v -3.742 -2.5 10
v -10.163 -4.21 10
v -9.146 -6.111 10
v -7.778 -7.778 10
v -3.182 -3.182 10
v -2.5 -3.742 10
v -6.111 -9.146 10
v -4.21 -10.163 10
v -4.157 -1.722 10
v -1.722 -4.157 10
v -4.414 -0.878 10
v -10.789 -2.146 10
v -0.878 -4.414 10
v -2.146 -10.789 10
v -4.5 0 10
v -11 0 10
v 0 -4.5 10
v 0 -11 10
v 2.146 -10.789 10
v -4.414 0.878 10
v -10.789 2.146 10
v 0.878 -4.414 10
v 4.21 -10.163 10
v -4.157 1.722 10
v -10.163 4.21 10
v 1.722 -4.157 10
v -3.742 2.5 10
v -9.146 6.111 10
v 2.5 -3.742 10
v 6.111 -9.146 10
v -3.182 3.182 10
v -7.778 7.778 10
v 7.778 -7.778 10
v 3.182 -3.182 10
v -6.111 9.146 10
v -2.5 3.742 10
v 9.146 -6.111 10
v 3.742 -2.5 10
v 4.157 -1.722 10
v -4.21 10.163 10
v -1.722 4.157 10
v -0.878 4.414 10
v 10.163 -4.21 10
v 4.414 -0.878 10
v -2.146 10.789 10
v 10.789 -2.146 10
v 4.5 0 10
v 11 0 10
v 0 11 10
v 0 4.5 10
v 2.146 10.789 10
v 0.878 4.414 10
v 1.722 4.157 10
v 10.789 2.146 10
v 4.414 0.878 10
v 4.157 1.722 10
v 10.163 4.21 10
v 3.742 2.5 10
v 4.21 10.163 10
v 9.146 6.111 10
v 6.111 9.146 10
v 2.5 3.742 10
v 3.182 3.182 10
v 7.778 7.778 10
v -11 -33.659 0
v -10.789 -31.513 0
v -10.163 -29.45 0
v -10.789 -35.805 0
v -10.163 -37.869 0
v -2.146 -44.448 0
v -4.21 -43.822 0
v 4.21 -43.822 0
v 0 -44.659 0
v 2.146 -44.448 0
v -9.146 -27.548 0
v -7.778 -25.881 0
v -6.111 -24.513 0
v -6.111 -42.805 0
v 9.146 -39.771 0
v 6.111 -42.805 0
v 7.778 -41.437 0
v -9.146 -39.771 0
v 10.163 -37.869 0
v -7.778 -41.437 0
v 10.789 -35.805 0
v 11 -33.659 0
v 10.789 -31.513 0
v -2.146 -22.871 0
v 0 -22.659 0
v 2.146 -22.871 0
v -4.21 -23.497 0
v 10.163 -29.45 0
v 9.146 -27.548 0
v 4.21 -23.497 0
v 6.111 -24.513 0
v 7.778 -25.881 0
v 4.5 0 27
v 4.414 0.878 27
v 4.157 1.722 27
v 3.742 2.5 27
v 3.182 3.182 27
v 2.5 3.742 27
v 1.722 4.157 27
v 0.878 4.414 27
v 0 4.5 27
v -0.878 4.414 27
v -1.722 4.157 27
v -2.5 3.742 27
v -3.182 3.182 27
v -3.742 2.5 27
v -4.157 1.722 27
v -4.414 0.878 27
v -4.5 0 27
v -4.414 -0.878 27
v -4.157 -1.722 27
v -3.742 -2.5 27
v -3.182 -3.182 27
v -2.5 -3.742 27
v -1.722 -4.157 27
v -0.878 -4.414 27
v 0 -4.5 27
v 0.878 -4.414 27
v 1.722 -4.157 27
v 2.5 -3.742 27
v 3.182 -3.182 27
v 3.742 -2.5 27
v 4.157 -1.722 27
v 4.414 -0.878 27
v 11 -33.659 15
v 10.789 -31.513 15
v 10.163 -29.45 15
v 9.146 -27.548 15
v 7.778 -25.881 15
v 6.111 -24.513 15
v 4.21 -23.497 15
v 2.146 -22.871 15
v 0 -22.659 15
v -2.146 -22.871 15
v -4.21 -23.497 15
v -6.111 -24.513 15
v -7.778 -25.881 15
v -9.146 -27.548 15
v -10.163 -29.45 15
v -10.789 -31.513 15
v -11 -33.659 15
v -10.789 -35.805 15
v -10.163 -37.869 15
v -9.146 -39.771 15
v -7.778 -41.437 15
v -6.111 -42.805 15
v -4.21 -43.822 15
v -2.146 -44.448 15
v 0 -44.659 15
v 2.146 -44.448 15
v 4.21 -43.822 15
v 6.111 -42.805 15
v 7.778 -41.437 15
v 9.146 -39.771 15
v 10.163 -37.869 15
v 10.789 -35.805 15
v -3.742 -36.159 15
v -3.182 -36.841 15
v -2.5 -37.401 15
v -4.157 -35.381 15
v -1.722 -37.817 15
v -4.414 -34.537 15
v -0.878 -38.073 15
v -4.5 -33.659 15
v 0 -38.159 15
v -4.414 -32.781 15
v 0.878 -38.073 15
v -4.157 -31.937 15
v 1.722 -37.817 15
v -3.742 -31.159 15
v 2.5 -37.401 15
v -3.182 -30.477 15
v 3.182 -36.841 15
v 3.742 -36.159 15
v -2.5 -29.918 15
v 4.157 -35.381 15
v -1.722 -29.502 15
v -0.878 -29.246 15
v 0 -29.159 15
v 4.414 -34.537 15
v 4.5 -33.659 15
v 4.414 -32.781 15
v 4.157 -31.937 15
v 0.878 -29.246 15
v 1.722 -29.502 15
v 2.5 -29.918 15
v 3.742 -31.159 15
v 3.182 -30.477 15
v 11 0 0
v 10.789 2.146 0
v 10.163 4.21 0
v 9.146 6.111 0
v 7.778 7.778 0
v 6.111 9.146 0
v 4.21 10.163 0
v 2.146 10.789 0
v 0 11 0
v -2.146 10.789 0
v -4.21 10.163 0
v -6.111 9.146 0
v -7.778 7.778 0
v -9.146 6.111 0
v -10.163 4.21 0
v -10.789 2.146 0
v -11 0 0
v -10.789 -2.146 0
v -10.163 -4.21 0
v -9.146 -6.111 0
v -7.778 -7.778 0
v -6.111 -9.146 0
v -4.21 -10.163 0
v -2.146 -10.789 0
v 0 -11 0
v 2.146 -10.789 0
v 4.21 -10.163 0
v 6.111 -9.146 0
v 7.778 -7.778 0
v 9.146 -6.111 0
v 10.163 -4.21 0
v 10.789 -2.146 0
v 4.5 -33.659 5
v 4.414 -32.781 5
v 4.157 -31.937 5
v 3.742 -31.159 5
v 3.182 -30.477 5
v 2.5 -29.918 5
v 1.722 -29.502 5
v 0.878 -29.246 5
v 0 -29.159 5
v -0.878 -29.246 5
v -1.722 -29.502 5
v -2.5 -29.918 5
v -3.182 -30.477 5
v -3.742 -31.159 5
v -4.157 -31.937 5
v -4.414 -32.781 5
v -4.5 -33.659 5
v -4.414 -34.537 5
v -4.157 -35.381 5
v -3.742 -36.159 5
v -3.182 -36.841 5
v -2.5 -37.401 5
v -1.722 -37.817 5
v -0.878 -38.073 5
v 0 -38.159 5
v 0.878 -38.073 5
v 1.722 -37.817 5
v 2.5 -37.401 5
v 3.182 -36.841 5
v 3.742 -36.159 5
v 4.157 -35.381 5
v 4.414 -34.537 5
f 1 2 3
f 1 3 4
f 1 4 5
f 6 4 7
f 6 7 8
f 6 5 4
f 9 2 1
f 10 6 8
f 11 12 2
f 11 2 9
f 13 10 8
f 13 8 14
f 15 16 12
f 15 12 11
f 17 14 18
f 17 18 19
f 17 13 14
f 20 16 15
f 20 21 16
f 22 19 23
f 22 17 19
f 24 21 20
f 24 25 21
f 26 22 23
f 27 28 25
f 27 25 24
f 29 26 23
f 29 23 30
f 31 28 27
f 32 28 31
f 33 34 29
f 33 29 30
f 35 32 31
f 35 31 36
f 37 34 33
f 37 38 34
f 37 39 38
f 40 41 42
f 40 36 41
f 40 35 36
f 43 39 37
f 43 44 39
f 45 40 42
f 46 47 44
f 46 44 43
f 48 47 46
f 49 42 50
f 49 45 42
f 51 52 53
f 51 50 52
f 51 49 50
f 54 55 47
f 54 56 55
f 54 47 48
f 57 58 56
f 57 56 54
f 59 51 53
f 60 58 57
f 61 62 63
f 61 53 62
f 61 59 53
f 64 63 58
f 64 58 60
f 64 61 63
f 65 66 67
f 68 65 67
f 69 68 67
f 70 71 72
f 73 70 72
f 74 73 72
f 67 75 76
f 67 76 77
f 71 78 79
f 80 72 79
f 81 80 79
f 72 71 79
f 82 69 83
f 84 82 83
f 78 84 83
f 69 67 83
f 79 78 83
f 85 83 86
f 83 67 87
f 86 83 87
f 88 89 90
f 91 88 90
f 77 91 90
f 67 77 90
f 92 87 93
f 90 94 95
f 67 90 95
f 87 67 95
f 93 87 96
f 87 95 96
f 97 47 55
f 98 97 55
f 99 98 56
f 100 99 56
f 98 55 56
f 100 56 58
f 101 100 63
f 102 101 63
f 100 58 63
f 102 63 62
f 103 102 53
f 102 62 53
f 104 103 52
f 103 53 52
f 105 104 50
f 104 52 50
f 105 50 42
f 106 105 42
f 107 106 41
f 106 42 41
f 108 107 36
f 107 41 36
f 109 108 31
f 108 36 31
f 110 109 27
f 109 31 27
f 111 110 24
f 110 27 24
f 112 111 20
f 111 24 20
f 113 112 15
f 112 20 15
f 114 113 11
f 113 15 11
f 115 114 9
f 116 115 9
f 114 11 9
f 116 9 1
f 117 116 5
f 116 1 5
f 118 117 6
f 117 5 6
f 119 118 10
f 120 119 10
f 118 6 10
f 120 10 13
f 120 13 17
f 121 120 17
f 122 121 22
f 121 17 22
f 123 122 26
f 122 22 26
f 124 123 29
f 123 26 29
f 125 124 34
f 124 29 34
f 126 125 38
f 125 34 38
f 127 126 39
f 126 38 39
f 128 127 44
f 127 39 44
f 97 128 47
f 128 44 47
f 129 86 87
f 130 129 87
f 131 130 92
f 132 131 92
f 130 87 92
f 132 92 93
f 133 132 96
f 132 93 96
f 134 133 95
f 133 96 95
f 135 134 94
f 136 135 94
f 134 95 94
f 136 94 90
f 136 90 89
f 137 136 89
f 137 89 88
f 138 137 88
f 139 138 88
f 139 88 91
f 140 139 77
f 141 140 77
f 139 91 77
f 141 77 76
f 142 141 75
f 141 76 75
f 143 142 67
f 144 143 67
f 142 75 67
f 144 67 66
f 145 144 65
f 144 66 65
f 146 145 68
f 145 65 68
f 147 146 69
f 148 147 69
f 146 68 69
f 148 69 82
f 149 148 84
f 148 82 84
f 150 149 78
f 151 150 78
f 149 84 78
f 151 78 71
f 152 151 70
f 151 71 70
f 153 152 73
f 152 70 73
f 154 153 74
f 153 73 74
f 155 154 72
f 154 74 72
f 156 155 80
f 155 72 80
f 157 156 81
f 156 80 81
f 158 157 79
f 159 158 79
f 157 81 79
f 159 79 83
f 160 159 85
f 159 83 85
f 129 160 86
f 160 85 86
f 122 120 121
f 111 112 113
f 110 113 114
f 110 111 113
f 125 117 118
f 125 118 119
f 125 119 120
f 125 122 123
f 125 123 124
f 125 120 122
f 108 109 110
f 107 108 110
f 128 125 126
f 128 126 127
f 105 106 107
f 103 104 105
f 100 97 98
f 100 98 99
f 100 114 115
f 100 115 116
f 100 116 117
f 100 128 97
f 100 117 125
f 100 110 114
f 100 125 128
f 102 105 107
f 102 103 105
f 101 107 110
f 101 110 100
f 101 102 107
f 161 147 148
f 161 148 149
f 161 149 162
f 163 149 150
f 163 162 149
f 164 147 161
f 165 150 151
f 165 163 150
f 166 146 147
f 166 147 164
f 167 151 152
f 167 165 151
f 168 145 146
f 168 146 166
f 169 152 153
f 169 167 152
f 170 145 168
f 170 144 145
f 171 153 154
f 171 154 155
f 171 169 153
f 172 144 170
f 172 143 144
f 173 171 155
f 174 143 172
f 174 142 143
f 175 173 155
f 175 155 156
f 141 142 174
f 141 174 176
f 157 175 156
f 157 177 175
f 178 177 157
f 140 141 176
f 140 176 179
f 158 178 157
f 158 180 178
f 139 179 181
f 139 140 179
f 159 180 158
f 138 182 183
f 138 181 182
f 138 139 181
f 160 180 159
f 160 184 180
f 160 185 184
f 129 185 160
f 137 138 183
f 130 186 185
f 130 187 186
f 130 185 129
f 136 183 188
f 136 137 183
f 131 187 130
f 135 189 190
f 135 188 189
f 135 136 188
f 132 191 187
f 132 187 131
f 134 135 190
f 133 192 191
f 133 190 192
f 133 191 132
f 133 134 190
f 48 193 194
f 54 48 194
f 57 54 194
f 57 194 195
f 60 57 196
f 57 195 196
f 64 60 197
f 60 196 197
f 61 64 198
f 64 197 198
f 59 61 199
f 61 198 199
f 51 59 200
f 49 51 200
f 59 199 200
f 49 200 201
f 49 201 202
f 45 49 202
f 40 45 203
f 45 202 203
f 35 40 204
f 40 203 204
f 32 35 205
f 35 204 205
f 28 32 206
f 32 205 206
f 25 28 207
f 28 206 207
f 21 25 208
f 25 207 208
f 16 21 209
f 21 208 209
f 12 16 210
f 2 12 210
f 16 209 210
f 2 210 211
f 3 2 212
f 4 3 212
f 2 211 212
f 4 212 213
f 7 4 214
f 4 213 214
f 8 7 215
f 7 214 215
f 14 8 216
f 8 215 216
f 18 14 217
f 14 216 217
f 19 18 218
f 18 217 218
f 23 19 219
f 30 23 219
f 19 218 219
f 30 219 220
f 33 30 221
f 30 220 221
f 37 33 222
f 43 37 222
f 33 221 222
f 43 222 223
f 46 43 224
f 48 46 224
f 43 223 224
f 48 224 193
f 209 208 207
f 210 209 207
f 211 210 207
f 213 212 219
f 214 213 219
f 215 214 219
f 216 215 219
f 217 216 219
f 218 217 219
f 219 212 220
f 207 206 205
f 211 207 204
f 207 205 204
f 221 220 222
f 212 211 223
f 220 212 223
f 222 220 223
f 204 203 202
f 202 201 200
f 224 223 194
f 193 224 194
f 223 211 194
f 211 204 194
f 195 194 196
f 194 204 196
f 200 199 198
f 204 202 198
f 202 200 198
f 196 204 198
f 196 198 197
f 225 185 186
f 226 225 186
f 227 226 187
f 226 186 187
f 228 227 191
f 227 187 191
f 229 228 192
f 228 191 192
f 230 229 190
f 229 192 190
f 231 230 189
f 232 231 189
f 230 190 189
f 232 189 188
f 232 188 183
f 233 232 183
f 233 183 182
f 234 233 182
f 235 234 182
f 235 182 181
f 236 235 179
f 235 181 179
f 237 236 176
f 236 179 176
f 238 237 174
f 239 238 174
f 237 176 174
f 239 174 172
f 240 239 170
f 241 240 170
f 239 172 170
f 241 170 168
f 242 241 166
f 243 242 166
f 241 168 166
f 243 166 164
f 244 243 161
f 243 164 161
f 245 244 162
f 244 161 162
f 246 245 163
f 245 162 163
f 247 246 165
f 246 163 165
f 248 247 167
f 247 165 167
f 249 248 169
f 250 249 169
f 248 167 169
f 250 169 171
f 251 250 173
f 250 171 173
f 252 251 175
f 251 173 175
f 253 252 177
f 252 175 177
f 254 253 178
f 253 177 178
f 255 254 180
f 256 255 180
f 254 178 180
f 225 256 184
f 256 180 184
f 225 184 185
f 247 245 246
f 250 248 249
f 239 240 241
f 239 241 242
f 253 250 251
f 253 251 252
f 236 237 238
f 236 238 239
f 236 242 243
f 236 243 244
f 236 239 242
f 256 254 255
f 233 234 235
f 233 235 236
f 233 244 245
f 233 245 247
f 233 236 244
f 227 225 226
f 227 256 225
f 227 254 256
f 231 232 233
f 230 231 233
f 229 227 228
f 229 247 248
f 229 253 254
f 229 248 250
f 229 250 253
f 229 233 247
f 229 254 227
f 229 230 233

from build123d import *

# Parameters (mm, degrees)
F0_R     = 11
F1_DEPTH = 10
F2_R     = 4.5
F3_DEPTH = 17
F4_R     = 11
F5_DEPTH = 15
F6_R     = 4.5
F7_DEPTH = 10


with BuildPart() as f1:
    # F0 (on Top) → F1 (new body)
    with BuildSketch(Plane.XY):
        Circle(F0_R)
    extrude(amount=F1_DEPTH)

    # F2 (on face) → F3 (join)
    with BuildSketch(Plane.XY.offset(10)):
        Circle(F2_R)
    extrude(amount=F3_DEPTH)


with BuildPart() as f5:
    # F4 (on Top) → F5 (new body)
    with BuildSketch(Plane.XY):
        with Locations((0, -33.659276)):
            Circle(F4_R)
    extrude(amount=F5_DEPTH)

    # F6 (on face) → F7 (cut)
    with BuildSketch(Plane.XY.offset(15)):
        with Locations((0, -33.659276)):
            Circle(F6_R)
    extrude(amount=-F7_DEPTH, mode=Mode.SUBTRACT)


solid = Compound([f1.part, f5.part])
